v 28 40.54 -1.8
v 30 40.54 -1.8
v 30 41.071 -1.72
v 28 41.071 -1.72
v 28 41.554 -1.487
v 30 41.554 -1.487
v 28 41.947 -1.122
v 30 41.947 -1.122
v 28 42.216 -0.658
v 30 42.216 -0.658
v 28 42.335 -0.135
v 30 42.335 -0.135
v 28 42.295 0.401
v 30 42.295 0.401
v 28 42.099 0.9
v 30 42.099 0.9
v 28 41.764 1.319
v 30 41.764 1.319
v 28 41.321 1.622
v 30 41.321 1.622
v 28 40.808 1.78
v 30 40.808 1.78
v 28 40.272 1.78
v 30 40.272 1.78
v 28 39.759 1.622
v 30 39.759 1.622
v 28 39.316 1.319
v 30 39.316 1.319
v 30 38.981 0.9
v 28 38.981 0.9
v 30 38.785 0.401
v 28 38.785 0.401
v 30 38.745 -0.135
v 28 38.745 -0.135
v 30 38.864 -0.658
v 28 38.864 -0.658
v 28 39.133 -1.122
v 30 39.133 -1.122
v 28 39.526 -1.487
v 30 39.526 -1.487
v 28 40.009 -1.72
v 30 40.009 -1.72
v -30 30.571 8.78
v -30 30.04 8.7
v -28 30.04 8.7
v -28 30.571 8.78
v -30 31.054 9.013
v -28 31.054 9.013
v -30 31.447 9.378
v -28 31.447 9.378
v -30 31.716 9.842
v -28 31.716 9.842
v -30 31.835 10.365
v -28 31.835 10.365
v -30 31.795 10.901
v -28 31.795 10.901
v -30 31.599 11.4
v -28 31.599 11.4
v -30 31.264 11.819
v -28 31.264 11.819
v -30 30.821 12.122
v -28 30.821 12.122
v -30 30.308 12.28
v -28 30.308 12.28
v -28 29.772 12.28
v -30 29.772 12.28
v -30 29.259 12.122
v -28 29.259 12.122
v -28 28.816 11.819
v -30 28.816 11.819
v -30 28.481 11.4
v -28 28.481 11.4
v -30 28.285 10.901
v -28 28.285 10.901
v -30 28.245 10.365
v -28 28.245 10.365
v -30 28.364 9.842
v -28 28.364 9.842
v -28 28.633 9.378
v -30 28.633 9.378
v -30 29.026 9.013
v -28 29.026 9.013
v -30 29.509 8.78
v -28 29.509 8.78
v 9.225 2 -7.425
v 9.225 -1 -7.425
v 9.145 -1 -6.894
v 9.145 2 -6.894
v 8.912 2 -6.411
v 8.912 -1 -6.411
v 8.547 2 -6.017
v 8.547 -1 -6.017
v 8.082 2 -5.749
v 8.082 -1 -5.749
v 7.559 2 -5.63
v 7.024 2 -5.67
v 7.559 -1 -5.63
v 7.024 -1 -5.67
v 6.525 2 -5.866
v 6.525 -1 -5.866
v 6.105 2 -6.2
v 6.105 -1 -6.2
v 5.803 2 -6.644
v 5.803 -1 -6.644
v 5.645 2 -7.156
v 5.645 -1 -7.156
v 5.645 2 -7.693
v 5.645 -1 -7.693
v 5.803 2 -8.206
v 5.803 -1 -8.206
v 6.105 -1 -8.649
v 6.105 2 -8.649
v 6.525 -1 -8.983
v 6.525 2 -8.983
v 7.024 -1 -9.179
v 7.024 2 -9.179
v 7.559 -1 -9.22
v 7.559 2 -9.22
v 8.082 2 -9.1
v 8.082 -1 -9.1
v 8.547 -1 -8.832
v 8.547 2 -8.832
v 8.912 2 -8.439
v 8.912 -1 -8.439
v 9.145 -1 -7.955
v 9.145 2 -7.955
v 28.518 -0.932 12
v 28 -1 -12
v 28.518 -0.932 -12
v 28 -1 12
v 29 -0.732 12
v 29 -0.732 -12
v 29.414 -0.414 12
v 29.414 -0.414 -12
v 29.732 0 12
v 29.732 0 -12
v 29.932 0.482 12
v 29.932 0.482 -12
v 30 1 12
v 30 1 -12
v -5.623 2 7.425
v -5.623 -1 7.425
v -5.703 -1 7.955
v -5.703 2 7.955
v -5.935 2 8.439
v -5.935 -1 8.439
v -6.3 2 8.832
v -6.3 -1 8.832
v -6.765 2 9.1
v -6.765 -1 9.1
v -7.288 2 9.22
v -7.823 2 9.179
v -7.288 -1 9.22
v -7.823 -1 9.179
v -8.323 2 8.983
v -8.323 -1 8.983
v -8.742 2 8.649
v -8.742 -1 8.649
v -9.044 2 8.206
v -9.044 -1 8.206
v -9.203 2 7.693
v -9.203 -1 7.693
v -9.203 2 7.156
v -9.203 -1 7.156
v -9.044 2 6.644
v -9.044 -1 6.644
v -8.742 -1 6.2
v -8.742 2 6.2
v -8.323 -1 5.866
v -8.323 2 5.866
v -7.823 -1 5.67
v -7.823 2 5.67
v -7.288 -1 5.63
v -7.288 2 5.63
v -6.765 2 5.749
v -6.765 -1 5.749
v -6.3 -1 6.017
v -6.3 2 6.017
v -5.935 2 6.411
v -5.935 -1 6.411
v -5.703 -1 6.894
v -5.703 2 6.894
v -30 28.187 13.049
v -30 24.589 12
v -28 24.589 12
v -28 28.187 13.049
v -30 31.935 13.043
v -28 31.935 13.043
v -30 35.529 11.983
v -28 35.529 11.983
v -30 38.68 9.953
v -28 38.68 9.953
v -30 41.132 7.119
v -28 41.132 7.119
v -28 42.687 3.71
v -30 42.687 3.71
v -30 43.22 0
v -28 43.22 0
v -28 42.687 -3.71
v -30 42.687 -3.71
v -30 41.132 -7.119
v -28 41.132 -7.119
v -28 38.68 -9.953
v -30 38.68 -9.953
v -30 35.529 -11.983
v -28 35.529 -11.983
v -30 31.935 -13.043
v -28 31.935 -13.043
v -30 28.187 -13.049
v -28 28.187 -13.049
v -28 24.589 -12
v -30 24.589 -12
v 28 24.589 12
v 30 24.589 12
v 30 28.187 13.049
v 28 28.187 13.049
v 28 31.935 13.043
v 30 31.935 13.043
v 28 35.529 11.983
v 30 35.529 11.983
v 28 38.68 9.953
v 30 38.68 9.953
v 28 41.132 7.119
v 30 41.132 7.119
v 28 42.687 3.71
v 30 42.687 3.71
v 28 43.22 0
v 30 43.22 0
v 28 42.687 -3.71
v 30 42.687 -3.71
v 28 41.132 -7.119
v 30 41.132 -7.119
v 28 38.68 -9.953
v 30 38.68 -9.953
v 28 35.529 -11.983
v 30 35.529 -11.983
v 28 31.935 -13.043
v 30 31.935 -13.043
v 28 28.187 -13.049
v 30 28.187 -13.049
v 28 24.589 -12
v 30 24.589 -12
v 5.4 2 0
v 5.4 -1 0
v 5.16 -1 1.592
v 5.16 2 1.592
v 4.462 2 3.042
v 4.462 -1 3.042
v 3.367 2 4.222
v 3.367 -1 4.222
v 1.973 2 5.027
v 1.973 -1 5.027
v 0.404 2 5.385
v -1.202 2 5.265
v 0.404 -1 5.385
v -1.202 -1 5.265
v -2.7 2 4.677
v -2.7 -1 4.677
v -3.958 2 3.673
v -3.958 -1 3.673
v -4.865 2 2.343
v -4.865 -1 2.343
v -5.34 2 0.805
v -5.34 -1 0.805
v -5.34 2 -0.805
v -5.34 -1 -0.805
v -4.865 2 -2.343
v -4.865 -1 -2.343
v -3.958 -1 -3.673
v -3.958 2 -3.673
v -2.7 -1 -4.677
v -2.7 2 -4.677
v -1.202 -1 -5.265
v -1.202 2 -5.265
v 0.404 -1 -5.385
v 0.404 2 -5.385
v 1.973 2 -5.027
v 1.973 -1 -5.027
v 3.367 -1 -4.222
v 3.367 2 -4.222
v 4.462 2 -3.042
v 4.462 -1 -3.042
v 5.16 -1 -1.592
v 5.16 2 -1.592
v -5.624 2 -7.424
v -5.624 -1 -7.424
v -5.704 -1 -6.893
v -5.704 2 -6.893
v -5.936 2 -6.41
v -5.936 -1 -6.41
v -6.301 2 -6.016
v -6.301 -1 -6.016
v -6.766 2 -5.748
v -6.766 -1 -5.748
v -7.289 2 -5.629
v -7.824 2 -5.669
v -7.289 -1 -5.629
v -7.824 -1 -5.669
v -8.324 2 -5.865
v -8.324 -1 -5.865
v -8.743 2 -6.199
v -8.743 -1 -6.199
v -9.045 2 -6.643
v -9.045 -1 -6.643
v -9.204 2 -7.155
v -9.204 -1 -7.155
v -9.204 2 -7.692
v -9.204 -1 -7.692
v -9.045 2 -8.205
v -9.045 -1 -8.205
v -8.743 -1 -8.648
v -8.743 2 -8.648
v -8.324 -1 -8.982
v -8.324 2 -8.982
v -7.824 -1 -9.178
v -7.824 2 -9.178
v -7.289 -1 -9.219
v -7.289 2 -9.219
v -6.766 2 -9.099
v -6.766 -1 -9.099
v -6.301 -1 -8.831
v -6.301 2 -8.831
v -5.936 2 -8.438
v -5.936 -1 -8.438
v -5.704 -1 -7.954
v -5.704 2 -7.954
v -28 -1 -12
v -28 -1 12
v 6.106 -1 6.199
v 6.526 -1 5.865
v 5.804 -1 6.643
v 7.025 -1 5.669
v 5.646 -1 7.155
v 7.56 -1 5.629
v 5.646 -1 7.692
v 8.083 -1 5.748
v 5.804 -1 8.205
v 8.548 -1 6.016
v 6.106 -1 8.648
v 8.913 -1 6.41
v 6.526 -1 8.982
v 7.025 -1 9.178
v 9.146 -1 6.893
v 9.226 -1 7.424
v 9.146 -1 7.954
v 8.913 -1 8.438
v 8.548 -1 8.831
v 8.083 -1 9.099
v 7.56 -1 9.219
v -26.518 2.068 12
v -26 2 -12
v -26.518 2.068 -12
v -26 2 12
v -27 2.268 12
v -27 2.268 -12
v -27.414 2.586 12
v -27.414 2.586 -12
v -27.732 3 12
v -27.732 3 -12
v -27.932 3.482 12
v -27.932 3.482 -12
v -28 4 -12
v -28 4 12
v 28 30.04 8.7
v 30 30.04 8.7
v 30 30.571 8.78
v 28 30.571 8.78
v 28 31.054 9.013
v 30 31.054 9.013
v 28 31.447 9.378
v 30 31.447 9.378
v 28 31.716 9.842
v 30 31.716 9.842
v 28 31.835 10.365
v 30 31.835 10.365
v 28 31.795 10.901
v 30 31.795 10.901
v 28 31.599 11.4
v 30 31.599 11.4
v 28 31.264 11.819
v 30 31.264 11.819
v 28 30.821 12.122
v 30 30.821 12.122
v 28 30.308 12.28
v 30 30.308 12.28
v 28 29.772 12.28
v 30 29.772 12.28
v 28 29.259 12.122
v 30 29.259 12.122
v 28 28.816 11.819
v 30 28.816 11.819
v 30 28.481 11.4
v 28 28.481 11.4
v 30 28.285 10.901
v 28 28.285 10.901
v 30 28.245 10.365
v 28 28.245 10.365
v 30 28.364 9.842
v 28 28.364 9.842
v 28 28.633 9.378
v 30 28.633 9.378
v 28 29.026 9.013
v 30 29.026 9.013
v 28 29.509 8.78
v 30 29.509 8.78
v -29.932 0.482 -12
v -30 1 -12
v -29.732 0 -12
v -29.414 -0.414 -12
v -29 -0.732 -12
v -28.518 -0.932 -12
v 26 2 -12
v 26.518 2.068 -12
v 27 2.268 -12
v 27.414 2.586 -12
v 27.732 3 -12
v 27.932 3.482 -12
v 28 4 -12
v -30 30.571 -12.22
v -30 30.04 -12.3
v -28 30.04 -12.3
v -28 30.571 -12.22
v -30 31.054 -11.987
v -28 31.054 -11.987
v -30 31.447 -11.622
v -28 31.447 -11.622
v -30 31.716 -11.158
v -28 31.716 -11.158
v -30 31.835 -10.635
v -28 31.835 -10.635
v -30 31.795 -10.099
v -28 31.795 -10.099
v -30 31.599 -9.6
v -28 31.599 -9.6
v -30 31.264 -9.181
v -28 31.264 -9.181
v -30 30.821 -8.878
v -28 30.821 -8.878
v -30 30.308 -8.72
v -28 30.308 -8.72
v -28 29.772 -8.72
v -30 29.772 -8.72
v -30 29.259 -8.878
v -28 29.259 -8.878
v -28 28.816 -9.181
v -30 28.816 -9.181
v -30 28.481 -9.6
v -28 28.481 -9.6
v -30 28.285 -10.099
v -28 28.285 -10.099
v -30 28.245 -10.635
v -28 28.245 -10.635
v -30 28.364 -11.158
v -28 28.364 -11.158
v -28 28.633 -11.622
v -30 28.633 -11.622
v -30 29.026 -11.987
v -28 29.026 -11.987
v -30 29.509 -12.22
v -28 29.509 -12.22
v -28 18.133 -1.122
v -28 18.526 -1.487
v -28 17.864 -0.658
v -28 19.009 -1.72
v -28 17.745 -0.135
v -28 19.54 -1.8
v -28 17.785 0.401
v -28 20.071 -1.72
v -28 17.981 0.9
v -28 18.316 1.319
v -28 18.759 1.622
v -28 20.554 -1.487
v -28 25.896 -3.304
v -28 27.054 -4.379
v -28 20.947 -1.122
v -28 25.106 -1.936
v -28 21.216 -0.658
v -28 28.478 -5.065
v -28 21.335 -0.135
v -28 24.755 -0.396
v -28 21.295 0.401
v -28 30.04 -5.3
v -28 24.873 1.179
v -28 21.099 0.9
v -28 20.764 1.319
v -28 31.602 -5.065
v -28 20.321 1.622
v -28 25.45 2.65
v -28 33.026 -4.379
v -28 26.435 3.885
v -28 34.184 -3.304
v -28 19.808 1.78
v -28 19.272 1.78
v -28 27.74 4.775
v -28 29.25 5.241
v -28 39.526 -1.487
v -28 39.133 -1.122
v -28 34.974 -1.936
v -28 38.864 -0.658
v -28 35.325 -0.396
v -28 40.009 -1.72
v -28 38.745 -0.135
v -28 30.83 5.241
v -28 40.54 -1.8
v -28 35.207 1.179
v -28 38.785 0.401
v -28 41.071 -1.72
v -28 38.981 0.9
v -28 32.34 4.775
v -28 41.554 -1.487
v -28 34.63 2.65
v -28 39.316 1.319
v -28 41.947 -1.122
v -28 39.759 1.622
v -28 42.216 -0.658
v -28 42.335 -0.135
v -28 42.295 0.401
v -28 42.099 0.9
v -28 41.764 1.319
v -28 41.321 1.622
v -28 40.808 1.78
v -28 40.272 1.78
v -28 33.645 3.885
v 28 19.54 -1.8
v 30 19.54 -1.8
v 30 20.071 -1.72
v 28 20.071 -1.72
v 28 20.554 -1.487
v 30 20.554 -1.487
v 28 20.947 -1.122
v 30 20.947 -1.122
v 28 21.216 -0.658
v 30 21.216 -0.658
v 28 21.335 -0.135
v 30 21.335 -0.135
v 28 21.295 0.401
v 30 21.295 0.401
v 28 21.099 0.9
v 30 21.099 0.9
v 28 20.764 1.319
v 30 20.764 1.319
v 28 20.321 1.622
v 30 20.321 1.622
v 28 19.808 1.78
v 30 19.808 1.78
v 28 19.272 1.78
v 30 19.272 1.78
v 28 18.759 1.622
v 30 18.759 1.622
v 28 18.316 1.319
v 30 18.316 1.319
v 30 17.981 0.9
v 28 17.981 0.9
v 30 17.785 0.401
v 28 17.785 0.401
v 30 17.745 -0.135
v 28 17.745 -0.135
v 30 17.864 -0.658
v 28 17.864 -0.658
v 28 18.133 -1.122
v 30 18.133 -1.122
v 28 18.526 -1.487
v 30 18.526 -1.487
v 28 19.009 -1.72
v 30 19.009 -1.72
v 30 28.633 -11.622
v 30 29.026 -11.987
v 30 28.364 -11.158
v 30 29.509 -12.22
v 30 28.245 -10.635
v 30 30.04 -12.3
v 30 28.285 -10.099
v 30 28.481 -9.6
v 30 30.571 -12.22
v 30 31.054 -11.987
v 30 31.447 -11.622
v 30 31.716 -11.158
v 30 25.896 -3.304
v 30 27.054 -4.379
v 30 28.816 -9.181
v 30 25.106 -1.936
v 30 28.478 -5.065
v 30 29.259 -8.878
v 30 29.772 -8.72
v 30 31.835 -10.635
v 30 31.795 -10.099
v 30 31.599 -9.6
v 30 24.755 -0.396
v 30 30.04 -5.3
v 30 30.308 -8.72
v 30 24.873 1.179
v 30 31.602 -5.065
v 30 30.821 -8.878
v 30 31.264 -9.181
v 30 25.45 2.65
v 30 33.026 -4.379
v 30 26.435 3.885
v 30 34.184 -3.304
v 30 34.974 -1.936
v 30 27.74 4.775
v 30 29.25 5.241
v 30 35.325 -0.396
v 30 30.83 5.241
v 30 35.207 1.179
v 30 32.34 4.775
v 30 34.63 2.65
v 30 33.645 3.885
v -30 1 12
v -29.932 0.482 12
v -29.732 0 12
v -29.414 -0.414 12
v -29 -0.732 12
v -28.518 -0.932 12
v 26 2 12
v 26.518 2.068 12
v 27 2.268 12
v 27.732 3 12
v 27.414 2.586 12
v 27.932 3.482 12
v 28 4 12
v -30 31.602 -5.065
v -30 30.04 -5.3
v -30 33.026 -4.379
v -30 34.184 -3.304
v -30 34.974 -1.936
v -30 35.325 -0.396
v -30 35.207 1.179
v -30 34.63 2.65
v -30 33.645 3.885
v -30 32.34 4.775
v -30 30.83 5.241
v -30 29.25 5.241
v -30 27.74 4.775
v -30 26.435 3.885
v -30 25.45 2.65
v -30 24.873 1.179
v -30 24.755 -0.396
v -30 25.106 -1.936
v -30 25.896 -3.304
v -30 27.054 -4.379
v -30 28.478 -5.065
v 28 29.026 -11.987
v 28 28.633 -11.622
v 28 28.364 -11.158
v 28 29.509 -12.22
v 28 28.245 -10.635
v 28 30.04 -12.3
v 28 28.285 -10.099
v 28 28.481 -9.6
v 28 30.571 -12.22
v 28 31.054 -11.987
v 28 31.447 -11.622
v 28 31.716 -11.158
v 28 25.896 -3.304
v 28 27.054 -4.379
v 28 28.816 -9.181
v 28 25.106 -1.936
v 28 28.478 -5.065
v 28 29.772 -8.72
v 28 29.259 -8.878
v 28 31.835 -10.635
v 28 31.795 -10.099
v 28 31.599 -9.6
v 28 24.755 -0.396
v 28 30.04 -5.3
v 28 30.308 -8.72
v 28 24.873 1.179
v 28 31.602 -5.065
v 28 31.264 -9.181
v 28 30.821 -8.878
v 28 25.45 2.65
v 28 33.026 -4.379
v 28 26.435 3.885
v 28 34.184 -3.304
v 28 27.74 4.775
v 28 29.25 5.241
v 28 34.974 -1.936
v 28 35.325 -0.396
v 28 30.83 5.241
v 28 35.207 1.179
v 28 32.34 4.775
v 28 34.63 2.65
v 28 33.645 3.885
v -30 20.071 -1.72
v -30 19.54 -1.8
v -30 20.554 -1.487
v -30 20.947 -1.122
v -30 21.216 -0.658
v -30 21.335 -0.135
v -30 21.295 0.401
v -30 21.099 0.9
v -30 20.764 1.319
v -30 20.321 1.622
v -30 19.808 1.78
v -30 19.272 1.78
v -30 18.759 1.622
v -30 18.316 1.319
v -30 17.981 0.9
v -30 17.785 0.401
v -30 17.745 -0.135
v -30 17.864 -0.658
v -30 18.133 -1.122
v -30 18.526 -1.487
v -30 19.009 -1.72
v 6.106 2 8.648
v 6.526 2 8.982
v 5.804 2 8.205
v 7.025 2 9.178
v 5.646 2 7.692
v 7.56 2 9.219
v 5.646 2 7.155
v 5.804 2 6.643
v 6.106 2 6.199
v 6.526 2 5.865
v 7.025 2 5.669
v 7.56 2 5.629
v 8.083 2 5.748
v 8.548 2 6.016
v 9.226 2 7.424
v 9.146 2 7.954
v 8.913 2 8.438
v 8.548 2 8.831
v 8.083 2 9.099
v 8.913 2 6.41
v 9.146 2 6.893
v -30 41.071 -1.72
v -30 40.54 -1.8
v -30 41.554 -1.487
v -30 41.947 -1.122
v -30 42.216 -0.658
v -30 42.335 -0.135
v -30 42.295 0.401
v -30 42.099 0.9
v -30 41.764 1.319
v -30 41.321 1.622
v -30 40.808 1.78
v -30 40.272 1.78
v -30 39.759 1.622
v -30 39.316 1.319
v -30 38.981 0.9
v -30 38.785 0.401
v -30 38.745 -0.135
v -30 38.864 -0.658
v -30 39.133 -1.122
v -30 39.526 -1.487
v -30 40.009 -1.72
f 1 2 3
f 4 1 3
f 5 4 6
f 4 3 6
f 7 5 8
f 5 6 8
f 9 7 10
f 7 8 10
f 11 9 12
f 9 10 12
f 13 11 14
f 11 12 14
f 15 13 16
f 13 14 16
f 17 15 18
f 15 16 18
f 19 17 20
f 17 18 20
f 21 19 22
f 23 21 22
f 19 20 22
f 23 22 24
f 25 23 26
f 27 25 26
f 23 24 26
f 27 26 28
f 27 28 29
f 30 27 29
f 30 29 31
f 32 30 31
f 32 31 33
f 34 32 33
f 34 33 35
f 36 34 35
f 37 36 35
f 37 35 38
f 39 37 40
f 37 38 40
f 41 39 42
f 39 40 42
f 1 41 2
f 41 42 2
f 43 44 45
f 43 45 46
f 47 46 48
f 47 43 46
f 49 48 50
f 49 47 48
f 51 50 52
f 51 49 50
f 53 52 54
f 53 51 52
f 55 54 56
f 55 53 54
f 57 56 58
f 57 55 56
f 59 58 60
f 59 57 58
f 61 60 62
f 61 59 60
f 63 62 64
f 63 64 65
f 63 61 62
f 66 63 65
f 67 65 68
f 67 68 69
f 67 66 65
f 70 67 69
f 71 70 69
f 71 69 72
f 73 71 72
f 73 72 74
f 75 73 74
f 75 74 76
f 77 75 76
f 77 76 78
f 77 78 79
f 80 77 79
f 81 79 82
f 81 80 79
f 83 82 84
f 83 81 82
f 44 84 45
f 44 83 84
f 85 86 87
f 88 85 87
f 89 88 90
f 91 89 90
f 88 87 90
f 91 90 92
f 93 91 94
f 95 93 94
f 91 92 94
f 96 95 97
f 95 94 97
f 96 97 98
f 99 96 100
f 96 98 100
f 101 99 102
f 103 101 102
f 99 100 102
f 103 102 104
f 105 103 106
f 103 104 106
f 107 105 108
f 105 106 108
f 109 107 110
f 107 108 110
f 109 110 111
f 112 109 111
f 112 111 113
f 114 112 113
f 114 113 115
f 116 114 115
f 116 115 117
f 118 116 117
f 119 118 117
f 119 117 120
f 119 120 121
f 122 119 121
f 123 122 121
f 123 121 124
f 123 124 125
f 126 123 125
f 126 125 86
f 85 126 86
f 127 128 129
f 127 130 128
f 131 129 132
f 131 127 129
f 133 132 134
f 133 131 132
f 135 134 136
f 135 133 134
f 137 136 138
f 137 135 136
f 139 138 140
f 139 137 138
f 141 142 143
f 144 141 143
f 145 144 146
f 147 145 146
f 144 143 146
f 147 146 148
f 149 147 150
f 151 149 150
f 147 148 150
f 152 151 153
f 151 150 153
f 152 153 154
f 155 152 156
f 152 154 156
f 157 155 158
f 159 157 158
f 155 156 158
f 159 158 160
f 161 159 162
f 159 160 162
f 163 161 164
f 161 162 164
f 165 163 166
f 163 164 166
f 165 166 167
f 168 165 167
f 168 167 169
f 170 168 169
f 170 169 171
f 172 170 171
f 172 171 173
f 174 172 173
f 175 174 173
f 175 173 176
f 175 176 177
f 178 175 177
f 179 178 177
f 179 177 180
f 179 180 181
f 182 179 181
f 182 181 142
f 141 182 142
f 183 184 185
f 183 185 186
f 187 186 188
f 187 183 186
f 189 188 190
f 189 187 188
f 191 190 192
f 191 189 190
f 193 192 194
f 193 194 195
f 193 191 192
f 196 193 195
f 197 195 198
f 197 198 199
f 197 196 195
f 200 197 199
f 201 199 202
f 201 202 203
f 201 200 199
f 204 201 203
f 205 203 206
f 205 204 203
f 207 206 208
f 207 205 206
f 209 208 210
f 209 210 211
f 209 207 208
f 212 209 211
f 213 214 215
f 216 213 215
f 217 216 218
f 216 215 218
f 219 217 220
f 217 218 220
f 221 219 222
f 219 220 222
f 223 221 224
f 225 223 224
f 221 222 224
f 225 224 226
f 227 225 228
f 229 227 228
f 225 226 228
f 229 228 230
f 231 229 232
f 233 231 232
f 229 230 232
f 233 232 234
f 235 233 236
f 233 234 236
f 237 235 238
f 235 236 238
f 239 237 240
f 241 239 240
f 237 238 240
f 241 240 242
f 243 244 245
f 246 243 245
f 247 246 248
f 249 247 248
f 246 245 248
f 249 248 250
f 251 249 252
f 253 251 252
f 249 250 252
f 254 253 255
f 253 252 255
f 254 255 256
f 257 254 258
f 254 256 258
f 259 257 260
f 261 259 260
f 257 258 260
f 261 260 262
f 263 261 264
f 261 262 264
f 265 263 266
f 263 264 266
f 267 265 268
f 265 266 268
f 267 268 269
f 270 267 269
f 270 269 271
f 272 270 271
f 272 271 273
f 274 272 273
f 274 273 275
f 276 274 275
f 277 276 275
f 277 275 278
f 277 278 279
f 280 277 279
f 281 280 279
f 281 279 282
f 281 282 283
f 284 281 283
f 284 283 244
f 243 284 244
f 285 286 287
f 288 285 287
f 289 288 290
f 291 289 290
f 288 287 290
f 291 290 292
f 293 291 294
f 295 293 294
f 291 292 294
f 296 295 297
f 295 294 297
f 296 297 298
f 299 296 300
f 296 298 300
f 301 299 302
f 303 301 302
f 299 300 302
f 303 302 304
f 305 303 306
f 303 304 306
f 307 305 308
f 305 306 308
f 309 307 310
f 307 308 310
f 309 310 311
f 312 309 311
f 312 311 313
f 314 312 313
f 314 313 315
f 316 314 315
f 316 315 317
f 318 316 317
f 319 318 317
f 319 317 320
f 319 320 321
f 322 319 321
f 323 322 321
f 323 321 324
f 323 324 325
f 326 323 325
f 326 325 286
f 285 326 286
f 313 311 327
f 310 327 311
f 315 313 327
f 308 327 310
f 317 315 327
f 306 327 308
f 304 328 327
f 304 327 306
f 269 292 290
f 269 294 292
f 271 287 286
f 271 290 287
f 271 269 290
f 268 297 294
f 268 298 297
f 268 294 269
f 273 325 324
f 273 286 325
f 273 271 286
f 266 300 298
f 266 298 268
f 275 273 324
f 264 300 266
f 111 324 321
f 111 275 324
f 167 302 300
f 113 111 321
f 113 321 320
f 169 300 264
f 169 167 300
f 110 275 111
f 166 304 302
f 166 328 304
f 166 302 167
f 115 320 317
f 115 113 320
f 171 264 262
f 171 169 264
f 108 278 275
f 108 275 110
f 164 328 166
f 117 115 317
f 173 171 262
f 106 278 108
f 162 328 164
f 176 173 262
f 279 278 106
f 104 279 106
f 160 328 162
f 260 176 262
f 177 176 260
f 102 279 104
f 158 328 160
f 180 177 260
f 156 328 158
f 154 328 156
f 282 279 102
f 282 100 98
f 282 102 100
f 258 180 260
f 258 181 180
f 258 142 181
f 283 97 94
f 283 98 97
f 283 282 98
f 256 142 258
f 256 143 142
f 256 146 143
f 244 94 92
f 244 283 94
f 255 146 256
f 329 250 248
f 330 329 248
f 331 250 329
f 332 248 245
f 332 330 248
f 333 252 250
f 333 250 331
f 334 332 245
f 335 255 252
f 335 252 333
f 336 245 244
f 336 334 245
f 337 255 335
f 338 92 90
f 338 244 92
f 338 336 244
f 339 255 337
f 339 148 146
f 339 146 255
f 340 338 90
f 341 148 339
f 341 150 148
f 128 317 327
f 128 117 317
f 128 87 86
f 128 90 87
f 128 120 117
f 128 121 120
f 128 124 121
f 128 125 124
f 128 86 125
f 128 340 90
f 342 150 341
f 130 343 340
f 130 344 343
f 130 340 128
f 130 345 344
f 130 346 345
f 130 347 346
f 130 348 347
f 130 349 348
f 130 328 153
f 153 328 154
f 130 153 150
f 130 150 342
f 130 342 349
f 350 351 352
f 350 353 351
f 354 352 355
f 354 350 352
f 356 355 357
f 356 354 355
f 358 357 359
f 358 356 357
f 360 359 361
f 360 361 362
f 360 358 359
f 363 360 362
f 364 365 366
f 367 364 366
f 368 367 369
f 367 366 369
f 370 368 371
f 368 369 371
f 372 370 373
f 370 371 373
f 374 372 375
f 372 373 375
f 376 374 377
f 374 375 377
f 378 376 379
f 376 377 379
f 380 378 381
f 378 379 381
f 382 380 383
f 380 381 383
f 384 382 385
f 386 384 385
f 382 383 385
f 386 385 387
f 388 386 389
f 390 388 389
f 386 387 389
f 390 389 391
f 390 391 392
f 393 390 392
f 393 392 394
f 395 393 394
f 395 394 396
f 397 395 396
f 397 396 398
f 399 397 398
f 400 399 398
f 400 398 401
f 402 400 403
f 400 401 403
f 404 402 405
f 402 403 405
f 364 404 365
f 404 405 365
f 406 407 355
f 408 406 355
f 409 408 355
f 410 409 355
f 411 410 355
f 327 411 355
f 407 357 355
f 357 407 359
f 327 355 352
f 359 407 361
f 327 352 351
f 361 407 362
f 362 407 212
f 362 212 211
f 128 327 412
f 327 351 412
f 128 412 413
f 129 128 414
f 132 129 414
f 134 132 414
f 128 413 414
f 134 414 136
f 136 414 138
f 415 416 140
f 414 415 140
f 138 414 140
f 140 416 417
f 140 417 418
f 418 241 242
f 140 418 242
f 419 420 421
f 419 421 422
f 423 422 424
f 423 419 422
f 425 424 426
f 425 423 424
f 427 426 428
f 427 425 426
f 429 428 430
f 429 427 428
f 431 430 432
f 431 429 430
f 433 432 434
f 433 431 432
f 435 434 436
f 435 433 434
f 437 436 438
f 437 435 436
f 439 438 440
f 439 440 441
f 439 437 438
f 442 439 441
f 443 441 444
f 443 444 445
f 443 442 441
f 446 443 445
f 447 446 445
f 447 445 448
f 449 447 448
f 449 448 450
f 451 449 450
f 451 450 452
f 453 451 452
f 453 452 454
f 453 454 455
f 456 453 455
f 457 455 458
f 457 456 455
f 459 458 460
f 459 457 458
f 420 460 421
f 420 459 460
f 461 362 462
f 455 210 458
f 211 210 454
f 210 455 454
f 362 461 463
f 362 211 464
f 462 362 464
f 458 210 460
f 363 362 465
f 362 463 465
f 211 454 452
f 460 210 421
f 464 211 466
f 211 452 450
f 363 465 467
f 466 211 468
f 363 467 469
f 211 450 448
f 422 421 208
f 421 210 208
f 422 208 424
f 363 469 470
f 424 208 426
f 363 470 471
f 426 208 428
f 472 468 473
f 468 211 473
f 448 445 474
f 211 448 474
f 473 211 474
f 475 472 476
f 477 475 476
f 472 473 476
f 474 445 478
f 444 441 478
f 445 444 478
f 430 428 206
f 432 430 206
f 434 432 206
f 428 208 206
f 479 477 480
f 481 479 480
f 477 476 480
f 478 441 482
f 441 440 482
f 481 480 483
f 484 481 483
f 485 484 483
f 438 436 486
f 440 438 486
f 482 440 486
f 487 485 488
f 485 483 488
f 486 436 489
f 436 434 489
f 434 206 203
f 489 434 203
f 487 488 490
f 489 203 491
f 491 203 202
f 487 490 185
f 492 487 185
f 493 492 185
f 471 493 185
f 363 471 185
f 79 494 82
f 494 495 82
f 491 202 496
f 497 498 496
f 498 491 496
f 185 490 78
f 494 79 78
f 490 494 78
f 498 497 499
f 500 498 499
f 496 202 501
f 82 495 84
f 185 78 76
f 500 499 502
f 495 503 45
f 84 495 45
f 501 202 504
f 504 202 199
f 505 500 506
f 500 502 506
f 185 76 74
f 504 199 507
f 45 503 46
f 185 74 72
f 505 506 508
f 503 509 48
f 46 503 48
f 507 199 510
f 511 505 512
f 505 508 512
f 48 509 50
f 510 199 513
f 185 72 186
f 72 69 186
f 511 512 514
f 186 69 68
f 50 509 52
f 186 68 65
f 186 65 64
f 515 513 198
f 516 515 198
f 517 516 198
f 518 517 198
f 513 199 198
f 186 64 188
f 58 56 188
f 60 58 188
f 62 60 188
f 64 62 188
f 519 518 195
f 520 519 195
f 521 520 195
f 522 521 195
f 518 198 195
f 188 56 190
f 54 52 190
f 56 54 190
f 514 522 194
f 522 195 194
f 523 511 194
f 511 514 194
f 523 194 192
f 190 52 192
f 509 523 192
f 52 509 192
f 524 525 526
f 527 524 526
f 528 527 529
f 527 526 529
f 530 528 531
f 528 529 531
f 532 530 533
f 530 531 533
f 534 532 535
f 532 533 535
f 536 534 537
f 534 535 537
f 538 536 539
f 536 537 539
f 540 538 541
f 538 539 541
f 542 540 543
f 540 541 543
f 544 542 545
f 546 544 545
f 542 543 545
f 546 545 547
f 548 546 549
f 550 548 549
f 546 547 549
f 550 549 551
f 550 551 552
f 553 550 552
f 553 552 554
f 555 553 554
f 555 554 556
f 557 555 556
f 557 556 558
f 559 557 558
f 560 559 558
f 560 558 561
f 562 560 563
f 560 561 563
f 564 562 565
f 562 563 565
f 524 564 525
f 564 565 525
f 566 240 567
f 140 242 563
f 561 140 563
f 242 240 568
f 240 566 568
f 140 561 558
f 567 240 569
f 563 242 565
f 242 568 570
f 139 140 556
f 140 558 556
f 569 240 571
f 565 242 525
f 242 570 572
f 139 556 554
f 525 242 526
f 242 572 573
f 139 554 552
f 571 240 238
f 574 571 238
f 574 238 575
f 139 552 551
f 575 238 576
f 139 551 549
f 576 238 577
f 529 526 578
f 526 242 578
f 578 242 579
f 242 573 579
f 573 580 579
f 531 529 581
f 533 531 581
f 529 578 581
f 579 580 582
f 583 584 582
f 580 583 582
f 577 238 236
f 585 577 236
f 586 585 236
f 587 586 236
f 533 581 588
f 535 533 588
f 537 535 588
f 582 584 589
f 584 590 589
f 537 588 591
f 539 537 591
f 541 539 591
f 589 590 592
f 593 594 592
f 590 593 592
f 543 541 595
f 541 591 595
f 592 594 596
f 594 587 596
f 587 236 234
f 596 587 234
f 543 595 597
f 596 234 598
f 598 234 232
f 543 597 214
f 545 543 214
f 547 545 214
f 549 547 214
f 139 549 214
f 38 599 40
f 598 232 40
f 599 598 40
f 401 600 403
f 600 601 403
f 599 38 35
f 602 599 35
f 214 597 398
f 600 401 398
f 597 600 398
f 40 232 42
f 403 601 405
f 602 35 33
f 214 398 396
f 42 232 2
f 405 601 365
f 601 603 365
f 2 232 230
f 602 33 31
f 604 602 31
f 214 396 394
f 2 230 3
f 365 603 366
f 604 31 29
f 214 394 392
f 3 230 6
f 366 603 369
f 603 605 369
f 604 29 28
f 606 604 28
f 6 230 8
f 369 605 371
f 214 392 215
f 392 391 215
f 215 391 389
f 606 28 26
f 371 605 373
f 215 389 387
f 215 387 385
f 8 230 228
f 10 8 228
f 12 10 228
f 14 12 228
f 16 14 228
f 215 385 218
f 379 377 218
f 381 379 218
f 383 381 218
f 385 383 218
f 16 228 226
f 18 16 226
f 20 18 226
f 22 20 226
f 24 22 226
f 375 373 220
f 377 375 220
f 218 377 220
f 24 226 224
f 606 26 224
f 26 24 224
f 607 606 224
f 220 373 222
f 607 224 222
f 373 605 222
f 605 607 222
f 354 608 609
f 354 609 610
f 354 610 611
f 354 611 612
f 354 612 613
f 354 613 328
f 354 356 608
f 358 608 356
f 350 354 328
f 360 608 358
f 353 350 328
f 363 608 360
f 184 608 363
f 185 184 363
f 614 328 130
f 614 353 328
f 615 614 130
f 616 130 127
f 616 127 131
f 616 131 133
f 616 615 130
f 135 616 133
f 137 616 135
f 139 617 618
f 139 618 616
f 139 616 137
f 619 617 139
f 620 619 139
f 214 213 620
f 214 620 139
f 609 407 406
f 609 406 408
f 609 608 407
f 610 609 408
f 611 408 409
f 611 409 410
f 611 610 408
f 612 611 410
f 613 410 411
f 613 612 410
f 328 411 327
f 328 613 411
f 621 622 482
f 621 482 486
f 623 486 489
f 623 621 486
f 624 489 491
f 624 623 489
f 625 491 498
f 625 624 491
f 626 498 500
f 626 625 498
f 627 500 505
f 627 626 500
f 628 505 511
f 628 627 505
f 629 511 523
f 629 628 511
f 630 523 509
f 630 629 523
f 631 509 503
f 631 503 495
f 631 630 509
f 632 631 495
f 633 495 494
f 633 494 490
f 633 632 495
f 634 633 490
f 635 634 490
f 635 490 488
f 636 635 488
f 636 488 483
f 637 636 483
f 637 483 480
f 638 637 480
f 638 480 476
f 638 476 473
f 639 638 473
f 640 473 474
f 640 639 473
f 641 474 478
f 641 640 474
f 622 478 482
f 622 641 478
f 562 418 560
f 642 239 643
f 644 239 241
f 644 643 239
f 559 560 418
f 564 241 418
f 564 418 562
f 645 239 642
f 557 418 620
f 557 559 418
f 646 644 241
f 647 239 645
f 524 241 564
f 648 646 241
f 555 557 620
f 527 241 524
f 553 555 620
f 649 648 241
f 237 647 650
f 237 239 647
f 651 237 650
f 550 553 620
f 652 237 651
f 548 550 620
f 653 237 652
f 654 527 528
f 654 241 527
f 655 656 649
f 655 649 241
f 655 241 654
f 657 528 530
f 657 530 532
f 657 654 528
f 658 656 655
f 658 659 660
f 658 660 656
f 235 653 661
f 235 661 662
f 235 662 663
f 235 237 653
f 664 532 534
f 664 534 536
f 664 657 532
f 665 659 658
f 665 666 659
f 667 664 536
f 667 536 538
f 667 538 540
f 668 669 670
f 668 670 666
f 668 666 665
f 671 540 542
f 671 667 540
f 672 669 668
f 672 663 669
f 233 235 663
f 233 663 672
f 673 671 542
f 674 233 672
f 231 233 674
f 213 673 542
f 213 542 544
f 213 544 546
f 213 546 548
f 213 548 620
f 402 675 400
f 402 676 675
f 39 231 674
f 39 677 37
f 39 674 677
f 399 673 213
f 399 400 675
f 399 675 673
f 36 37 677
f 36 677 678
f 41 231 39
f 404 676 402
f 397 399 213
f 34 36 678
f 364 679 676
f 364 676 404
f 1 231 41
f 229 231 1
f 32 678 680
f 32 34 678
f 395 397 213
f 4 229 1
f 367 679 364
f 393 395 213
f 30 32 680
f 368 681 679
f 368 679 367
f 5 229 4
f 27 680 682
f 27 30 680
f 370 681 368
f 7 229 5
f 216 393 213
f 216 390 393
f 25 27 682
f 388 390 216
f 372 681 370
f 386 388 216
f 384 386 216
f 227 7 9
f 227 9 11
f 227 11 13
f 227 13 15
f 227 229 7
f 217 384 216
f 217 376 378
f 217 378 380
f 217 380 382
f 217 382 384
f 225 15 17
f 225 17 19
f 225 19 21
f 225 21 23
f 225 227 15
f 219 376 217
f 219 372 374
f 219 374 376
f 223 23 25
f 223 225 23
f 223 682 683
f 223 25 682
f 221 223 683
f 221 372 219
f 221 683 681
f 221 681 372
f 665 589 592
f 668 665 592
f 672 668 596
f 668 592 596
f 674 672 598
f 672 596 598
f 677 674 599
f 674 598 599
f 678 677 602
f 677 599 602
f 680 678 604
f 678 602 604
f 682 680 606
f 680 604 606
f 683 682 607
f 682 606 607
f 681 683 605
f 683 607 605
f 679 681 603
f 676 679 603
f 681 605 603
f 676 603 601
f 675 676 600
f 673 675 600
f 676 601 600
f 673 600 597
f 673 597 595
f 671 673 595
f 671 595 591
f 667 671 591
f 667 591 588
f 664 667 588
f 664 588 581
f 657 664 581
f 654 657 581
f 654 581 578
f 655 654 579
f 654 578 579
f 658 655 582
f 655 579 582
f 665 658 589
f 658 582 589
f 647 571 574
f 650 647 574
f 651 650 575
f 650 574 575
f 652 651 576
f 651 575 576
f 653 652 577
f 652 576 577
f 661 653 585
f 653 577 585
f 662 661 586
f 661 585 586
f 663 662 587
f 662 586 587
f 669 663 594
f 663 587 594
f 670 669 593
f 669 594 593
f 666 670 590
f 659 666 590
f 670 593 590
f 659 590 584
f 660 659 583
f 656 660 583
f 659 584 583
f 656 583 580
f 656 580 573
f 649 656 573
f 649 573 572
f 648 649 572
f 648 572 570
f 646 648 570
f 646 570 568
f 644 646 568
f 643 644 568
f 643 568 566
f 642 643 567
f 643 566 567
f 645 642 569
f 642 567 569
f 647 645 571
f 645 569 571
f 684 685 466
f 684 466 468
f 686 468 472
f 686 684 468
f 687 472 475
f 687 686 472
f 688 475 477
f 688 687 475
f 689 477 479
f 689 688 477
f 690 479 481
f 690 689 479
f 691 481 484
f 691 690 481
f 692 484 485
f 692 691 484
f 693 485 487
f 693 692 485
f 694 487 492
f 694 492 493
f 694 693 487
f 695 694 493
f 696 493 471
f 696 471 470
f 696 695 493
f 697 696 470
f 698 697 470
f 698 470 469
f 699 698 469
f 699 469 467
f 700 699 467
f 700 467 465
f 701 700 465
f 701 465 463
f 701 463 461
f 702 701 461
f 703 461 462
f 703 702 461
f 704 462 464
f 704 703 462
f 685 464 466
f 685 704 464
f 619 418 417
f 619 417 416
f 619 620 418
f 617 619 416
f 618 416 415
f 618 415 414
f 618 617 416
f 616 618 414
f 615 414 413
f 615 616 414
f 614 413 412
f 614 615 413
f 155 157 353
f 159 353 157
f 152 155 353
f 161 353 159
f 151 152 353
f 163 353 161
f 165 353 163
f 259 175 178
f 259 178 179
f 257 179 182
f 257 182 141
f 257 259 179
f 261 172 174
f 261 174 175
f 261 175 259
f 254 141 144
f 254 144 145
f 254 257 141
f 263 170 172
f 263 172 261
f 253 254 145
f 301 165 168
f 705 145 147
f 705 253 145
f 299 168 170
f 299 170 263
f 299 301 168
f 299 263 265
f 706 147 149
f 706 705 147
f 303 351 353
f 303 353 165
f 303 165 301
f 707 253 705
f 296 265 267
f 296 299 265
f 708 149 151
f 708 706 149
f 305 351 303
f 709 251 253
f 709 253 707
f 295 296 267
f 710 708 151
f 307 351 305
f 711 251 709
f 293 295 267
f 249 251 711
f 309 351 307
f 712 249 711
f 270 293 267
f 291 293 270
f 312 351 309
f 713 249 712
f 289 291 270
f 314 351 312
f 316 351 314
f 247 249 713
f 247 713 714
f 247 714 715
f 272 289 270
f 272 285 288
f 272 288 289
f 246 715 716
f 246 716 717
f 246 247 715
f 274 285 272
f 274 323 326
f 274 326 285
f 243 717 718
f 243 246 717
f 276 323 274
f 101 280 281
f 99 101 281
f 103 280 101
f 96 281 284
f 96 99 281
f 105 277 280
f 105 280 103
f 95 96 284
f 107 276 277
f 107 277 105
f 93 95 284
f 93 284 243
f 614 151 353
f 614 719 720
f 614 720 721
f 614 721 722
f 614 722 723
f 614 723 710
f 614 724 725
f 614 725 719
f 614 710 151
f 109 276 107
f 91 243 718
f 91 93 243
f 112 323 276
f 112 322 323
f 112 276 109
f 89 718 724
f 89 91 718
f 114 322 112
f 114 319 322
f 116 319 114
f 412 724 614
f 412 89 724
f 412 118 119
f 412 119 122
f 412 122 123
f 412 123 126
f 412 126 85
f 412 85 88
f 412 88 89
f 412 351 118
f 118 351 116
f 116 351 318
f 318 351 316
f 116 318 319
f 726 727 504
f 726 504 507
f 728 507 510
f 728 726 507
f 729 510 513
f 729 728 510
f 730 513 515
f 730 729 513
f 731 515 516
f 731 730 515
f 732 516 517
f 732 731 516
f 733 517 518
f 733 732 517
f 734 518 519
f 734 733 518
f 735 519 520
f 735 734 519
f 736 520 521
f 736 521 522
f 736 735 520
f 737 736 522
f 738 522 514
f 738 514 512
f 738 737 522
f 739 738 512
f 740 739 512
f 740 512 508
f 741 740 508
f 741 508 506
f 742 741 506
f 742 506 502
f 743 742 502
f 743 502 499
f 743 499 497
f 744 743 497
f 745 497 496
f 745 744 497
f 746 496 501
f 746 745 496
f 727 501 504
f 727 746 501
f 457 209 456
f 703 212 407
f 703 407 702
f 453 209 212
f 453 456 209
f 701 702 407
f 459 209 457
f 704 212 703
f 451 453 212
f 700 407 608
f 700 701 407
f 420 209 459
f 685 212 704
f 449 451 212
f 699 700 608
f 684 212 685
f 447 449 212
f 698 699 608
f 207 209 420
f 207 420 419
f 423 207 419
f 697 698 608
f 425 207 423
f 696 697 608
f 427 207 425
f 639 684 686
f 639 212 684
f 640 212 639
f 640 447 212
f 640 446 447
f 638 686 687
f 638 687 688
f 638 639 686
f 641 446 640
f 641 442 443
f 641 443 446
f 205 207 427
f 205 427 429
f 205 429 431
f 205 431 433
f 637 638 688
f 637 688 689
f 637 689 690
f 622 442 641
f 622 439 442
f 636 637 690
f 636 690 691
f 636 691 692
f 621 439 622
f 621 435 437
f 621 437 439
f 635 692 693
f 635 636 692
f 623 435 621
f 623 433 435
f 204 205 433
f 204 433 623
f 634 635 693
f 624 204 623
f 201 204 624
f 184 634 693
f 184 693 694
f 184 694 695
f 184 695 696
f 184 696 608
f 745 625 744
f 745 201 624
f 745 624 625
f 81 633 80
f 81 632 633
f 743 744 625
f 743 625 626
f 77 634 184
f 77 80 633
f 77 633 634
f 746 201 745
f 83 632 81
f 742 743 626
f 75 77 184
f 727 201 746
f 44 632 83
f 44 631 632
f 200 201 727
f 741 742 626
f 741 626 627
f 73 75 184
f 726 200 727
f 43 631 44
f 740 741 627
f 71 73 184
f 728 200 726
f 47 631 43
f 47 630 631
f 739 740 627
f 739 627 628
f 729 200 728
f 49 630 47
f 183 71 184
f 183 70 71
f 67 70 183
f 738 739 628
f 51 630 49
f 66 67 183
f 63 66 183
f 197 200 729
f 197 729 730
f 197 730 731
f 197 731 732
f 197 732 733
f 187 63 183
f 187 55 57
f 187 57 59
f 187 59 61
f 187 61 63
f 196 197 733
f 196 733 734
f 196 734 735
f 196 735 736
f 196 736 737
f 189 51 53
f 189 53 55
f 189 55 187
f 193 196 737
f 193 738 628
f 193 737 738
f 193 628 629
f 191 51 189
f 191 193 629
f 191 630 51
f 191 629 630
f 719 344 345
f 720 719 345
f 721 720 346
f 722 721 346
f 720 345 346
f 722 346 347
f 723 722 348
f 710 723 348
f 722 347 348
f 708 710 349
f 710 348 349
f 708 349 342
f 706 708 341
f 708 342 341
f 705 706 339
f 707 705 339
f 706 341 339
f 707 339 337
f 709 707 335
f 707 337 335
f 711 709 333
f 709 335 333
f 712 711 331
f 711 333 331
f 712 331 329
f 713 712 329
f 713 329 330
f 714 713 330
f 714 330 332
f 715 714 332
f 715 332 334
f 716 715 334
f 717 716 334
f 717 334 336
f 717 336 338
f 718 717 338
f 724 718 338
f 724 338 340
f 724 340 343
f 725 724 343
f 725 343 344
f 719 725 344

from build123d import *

# Parameters (mm, degrees)
CROQUIS1_W              = 60
CROQUIS1_H              = 24
SALIENTE_EXTRUIR1_DEPTH = 2
CROQUIS3_R              = 5.3
SALIENTE_EXTRUIR2_DEPTH = 2
CROQUIS5_R              = 1.8
CORTAR_EXTRUIR1_DEPTH   = 2
CROQUIS6_W              = 60
CROQUIS6_H              = 24
SALIENTE_EXTRUIR3_DEPTH = 1
CORTAR_EXTRUIR2_REACH   = 46.22
CROQUIS7_R              = 5.4
CROQUIS7_R_2            = 1.8
REDONDEO1_R             = 2


with BuildPart() as part:
    # Croquis1 → Saliente-Extruir1 (new body)
    with BuildSketch(Plane(origin=(0, 0, 0), x_dir=(1, 0, 0), z_dir=(0, 1, 0))):
        Rectangle(CROQUIS1_W, CROQUIS1_H)
    extrude(amount=SALIENTE_EXTRUIR1_DEPTH)

    # Croquis3 → Saliente-Extruir2 (add)
    with BuildSketch(Plane(origin=(30, 0, 0), x_dir=(0, 0, -1), z_dir=(1, 0, 0))):
        with BuildLine():
            Line((12, 2), (-12, 2))
            Line((-12, 2), (-12, 24.589091819))
            ThreePointArc((-12, 24.589091819), (0, 43.22), (12, 24.589091819))
            Line((12, 24.589091819), (12, 2))
        make_face()
        with Locations((0, 30.04)):
            Circle(CROQUIS3_R, mode=Mode.SUBTRACT)
    saliente_extruir2 = extrude(amount=-SALIENTE_EXTRUIR2_DEPTH)

    # Croquis5 → Cortar-Extruir1 (cut)
    with BuildSketch(Plane(origin=(30, 0, 0), x_dir=(0, 0, -1), z_dir=(1, 0, 0))):
        with Locations((0, 40.54)):
            Circle(CROQUIS5_R)
        with Locations((10.5, 30.04)):
            Circle(CROQUIS5_R)
        with Locations((0, 19.54)):
            Circle(CROQUIS5_R)
        with Locations((-10.5, 30.04)):
            Circle(CROQUIS5_R)
    cortar_extruir1 = extrude(amount=-CORTAR_EXTRUIR1_DEPTH, mode=Mode.SUBTRACT)

    # Simetría1: Saliente-Extruir2, Cortar-Extruir1 across plane
    add(saliente_extruir2.mirror(Plane(origin=(0, 0, 0), x_dir=(0, 0, 1), z_dir=(1, 0, 0))))
    add(cortar_extruir1.mirror(Plane(origin=(0, 0, 0), x_dir=(0, 0, 1), z_dir=(1, 0, 0))), mode=Mode.SUBTRACT)

    # Croquis6 → Saliente-Extruir3 (add)
    with BuildSketch(Plane.XZ):
        Rectangle(CROQUIS6_W, CROQUIS6_H)
    extrude(amount=SALIENTE_EXTRUIR3_DEPTH)

    # Croquis7 → Cortar-Extruir2 (cut, up to next)
    with BuildSketch(Plane.XZ.offset(1), mode=Mode.PRIVATE) as cortar_extruir2_sk1:
        Circle(CROQUIS7_R)
    cortar_extruir2_tool1 = extrude(cortar_extruir2_sk1.sketch, amount=-CORTAR_EXTRUIR2_REACH, mode=Mode.PRIVATE) & part.part
    add(cortar_extruir2_tool1.solids().sort_by_distance((0, -1, 0))[0], mode=Mode.SUBTRACT)
    # Croquis7 → Cortar-Extruir2 (cut, up to next)
    with BuildSketch(Plane.XZ.offset(1), mode=Mode.PRIVATE) as cortar_extruir2_sk2:
        with Locations((7.424621202, -7.424621202)):
            Circle(CROQUIS7_R_2)
    cortar_extruir2_tool2 = extrude(cortar_extruir2_sk2.sketch, amount=-CORTAR_EXTRUIR2_REACH, mode=Mode.PRIVATE) & part.part
    add(cortar_extruir2_tool2.solids().sort_by_distance((7.424621, -1, -7.424621))[0], mode=Mode.SUBTRACT)
    # Croquis7 → Cortar-Extruir2 (cut, up to next)
    with BuildSketch(Plane.XZ.offset(1), mode=Mode.PRIVATE) as cortar_extruir2_sk3:
        with Locations((-7.423621202, -7.423621202)):
            Circle(CROQUIS7_R_2)
    cortar_extruir2_tool3 = extrude(cortar_extruir2_sk3.sketch, amount=-CORTAR_EXTRUIR2_REACH, mode=Mode.PRIVATE) & part.part
    add(cortar_extruir2_tool3.solids().sort_by_distance((-7.423621, -1, -7.423621))[0], mode=Mode.SUBTRACT)
    # Croquis7 → Cortar-Extruir2 (cut, up to next)
    with BuildSketch(Plane.XZ.offset(1), mode=Mode.PRIVATE) as cortar_extruir2_sk4:
        with Locations((-7.422621202, 7.424621202)):
            Circle(CROQUIS7_R_2)
    cortar_extruir2_tool4 = extrude(cortar_extruir2_sk4.sketch, amount=-CORTAR_EXTRUIR2_REACH, mode=Mode.PRIVATE) & part.part
    add(cortar_extruir2_tool4.solids().sort_by_distance((-7.422621, -1, 7.424621))[0], mode=Mode.SUBTRACT)
    # Croquis7 → Cortar-Extruir2 (cut, up to next)
    with BuildSketch(Plane.XZ.offset(1), mode=Mode.PRIVATE) as cortar_extruir2_sk5:
        with Locations((7.425621202, 7.423621202)):
            Circle(CROQUIS7_R_2)
    cortar_extruir2_tool5 = extrude(cortar_extruir2_sk5.sketch, amount=-CORTAR_EXTRUIR2_REACH, mode=Mode.PRIVATE) & part.part
    add(cortar_extruir2_tool5.solids().sort_by_distance((7.425621, -1, 7.423621))[0], mode=Mode.SUBTRACT)

    # Redondeo1
    redondeo1_edges = [part.edges().sort_by_distance(p)[0] for p in [
        (-28, 2, 0),
        (28, 2, 0),
        (-30, -1, 0),
        (30, -1, 0),
    ]]
    fillet(redondeo1_edges, radius=REDONDEO1_R)


solid = part.part
